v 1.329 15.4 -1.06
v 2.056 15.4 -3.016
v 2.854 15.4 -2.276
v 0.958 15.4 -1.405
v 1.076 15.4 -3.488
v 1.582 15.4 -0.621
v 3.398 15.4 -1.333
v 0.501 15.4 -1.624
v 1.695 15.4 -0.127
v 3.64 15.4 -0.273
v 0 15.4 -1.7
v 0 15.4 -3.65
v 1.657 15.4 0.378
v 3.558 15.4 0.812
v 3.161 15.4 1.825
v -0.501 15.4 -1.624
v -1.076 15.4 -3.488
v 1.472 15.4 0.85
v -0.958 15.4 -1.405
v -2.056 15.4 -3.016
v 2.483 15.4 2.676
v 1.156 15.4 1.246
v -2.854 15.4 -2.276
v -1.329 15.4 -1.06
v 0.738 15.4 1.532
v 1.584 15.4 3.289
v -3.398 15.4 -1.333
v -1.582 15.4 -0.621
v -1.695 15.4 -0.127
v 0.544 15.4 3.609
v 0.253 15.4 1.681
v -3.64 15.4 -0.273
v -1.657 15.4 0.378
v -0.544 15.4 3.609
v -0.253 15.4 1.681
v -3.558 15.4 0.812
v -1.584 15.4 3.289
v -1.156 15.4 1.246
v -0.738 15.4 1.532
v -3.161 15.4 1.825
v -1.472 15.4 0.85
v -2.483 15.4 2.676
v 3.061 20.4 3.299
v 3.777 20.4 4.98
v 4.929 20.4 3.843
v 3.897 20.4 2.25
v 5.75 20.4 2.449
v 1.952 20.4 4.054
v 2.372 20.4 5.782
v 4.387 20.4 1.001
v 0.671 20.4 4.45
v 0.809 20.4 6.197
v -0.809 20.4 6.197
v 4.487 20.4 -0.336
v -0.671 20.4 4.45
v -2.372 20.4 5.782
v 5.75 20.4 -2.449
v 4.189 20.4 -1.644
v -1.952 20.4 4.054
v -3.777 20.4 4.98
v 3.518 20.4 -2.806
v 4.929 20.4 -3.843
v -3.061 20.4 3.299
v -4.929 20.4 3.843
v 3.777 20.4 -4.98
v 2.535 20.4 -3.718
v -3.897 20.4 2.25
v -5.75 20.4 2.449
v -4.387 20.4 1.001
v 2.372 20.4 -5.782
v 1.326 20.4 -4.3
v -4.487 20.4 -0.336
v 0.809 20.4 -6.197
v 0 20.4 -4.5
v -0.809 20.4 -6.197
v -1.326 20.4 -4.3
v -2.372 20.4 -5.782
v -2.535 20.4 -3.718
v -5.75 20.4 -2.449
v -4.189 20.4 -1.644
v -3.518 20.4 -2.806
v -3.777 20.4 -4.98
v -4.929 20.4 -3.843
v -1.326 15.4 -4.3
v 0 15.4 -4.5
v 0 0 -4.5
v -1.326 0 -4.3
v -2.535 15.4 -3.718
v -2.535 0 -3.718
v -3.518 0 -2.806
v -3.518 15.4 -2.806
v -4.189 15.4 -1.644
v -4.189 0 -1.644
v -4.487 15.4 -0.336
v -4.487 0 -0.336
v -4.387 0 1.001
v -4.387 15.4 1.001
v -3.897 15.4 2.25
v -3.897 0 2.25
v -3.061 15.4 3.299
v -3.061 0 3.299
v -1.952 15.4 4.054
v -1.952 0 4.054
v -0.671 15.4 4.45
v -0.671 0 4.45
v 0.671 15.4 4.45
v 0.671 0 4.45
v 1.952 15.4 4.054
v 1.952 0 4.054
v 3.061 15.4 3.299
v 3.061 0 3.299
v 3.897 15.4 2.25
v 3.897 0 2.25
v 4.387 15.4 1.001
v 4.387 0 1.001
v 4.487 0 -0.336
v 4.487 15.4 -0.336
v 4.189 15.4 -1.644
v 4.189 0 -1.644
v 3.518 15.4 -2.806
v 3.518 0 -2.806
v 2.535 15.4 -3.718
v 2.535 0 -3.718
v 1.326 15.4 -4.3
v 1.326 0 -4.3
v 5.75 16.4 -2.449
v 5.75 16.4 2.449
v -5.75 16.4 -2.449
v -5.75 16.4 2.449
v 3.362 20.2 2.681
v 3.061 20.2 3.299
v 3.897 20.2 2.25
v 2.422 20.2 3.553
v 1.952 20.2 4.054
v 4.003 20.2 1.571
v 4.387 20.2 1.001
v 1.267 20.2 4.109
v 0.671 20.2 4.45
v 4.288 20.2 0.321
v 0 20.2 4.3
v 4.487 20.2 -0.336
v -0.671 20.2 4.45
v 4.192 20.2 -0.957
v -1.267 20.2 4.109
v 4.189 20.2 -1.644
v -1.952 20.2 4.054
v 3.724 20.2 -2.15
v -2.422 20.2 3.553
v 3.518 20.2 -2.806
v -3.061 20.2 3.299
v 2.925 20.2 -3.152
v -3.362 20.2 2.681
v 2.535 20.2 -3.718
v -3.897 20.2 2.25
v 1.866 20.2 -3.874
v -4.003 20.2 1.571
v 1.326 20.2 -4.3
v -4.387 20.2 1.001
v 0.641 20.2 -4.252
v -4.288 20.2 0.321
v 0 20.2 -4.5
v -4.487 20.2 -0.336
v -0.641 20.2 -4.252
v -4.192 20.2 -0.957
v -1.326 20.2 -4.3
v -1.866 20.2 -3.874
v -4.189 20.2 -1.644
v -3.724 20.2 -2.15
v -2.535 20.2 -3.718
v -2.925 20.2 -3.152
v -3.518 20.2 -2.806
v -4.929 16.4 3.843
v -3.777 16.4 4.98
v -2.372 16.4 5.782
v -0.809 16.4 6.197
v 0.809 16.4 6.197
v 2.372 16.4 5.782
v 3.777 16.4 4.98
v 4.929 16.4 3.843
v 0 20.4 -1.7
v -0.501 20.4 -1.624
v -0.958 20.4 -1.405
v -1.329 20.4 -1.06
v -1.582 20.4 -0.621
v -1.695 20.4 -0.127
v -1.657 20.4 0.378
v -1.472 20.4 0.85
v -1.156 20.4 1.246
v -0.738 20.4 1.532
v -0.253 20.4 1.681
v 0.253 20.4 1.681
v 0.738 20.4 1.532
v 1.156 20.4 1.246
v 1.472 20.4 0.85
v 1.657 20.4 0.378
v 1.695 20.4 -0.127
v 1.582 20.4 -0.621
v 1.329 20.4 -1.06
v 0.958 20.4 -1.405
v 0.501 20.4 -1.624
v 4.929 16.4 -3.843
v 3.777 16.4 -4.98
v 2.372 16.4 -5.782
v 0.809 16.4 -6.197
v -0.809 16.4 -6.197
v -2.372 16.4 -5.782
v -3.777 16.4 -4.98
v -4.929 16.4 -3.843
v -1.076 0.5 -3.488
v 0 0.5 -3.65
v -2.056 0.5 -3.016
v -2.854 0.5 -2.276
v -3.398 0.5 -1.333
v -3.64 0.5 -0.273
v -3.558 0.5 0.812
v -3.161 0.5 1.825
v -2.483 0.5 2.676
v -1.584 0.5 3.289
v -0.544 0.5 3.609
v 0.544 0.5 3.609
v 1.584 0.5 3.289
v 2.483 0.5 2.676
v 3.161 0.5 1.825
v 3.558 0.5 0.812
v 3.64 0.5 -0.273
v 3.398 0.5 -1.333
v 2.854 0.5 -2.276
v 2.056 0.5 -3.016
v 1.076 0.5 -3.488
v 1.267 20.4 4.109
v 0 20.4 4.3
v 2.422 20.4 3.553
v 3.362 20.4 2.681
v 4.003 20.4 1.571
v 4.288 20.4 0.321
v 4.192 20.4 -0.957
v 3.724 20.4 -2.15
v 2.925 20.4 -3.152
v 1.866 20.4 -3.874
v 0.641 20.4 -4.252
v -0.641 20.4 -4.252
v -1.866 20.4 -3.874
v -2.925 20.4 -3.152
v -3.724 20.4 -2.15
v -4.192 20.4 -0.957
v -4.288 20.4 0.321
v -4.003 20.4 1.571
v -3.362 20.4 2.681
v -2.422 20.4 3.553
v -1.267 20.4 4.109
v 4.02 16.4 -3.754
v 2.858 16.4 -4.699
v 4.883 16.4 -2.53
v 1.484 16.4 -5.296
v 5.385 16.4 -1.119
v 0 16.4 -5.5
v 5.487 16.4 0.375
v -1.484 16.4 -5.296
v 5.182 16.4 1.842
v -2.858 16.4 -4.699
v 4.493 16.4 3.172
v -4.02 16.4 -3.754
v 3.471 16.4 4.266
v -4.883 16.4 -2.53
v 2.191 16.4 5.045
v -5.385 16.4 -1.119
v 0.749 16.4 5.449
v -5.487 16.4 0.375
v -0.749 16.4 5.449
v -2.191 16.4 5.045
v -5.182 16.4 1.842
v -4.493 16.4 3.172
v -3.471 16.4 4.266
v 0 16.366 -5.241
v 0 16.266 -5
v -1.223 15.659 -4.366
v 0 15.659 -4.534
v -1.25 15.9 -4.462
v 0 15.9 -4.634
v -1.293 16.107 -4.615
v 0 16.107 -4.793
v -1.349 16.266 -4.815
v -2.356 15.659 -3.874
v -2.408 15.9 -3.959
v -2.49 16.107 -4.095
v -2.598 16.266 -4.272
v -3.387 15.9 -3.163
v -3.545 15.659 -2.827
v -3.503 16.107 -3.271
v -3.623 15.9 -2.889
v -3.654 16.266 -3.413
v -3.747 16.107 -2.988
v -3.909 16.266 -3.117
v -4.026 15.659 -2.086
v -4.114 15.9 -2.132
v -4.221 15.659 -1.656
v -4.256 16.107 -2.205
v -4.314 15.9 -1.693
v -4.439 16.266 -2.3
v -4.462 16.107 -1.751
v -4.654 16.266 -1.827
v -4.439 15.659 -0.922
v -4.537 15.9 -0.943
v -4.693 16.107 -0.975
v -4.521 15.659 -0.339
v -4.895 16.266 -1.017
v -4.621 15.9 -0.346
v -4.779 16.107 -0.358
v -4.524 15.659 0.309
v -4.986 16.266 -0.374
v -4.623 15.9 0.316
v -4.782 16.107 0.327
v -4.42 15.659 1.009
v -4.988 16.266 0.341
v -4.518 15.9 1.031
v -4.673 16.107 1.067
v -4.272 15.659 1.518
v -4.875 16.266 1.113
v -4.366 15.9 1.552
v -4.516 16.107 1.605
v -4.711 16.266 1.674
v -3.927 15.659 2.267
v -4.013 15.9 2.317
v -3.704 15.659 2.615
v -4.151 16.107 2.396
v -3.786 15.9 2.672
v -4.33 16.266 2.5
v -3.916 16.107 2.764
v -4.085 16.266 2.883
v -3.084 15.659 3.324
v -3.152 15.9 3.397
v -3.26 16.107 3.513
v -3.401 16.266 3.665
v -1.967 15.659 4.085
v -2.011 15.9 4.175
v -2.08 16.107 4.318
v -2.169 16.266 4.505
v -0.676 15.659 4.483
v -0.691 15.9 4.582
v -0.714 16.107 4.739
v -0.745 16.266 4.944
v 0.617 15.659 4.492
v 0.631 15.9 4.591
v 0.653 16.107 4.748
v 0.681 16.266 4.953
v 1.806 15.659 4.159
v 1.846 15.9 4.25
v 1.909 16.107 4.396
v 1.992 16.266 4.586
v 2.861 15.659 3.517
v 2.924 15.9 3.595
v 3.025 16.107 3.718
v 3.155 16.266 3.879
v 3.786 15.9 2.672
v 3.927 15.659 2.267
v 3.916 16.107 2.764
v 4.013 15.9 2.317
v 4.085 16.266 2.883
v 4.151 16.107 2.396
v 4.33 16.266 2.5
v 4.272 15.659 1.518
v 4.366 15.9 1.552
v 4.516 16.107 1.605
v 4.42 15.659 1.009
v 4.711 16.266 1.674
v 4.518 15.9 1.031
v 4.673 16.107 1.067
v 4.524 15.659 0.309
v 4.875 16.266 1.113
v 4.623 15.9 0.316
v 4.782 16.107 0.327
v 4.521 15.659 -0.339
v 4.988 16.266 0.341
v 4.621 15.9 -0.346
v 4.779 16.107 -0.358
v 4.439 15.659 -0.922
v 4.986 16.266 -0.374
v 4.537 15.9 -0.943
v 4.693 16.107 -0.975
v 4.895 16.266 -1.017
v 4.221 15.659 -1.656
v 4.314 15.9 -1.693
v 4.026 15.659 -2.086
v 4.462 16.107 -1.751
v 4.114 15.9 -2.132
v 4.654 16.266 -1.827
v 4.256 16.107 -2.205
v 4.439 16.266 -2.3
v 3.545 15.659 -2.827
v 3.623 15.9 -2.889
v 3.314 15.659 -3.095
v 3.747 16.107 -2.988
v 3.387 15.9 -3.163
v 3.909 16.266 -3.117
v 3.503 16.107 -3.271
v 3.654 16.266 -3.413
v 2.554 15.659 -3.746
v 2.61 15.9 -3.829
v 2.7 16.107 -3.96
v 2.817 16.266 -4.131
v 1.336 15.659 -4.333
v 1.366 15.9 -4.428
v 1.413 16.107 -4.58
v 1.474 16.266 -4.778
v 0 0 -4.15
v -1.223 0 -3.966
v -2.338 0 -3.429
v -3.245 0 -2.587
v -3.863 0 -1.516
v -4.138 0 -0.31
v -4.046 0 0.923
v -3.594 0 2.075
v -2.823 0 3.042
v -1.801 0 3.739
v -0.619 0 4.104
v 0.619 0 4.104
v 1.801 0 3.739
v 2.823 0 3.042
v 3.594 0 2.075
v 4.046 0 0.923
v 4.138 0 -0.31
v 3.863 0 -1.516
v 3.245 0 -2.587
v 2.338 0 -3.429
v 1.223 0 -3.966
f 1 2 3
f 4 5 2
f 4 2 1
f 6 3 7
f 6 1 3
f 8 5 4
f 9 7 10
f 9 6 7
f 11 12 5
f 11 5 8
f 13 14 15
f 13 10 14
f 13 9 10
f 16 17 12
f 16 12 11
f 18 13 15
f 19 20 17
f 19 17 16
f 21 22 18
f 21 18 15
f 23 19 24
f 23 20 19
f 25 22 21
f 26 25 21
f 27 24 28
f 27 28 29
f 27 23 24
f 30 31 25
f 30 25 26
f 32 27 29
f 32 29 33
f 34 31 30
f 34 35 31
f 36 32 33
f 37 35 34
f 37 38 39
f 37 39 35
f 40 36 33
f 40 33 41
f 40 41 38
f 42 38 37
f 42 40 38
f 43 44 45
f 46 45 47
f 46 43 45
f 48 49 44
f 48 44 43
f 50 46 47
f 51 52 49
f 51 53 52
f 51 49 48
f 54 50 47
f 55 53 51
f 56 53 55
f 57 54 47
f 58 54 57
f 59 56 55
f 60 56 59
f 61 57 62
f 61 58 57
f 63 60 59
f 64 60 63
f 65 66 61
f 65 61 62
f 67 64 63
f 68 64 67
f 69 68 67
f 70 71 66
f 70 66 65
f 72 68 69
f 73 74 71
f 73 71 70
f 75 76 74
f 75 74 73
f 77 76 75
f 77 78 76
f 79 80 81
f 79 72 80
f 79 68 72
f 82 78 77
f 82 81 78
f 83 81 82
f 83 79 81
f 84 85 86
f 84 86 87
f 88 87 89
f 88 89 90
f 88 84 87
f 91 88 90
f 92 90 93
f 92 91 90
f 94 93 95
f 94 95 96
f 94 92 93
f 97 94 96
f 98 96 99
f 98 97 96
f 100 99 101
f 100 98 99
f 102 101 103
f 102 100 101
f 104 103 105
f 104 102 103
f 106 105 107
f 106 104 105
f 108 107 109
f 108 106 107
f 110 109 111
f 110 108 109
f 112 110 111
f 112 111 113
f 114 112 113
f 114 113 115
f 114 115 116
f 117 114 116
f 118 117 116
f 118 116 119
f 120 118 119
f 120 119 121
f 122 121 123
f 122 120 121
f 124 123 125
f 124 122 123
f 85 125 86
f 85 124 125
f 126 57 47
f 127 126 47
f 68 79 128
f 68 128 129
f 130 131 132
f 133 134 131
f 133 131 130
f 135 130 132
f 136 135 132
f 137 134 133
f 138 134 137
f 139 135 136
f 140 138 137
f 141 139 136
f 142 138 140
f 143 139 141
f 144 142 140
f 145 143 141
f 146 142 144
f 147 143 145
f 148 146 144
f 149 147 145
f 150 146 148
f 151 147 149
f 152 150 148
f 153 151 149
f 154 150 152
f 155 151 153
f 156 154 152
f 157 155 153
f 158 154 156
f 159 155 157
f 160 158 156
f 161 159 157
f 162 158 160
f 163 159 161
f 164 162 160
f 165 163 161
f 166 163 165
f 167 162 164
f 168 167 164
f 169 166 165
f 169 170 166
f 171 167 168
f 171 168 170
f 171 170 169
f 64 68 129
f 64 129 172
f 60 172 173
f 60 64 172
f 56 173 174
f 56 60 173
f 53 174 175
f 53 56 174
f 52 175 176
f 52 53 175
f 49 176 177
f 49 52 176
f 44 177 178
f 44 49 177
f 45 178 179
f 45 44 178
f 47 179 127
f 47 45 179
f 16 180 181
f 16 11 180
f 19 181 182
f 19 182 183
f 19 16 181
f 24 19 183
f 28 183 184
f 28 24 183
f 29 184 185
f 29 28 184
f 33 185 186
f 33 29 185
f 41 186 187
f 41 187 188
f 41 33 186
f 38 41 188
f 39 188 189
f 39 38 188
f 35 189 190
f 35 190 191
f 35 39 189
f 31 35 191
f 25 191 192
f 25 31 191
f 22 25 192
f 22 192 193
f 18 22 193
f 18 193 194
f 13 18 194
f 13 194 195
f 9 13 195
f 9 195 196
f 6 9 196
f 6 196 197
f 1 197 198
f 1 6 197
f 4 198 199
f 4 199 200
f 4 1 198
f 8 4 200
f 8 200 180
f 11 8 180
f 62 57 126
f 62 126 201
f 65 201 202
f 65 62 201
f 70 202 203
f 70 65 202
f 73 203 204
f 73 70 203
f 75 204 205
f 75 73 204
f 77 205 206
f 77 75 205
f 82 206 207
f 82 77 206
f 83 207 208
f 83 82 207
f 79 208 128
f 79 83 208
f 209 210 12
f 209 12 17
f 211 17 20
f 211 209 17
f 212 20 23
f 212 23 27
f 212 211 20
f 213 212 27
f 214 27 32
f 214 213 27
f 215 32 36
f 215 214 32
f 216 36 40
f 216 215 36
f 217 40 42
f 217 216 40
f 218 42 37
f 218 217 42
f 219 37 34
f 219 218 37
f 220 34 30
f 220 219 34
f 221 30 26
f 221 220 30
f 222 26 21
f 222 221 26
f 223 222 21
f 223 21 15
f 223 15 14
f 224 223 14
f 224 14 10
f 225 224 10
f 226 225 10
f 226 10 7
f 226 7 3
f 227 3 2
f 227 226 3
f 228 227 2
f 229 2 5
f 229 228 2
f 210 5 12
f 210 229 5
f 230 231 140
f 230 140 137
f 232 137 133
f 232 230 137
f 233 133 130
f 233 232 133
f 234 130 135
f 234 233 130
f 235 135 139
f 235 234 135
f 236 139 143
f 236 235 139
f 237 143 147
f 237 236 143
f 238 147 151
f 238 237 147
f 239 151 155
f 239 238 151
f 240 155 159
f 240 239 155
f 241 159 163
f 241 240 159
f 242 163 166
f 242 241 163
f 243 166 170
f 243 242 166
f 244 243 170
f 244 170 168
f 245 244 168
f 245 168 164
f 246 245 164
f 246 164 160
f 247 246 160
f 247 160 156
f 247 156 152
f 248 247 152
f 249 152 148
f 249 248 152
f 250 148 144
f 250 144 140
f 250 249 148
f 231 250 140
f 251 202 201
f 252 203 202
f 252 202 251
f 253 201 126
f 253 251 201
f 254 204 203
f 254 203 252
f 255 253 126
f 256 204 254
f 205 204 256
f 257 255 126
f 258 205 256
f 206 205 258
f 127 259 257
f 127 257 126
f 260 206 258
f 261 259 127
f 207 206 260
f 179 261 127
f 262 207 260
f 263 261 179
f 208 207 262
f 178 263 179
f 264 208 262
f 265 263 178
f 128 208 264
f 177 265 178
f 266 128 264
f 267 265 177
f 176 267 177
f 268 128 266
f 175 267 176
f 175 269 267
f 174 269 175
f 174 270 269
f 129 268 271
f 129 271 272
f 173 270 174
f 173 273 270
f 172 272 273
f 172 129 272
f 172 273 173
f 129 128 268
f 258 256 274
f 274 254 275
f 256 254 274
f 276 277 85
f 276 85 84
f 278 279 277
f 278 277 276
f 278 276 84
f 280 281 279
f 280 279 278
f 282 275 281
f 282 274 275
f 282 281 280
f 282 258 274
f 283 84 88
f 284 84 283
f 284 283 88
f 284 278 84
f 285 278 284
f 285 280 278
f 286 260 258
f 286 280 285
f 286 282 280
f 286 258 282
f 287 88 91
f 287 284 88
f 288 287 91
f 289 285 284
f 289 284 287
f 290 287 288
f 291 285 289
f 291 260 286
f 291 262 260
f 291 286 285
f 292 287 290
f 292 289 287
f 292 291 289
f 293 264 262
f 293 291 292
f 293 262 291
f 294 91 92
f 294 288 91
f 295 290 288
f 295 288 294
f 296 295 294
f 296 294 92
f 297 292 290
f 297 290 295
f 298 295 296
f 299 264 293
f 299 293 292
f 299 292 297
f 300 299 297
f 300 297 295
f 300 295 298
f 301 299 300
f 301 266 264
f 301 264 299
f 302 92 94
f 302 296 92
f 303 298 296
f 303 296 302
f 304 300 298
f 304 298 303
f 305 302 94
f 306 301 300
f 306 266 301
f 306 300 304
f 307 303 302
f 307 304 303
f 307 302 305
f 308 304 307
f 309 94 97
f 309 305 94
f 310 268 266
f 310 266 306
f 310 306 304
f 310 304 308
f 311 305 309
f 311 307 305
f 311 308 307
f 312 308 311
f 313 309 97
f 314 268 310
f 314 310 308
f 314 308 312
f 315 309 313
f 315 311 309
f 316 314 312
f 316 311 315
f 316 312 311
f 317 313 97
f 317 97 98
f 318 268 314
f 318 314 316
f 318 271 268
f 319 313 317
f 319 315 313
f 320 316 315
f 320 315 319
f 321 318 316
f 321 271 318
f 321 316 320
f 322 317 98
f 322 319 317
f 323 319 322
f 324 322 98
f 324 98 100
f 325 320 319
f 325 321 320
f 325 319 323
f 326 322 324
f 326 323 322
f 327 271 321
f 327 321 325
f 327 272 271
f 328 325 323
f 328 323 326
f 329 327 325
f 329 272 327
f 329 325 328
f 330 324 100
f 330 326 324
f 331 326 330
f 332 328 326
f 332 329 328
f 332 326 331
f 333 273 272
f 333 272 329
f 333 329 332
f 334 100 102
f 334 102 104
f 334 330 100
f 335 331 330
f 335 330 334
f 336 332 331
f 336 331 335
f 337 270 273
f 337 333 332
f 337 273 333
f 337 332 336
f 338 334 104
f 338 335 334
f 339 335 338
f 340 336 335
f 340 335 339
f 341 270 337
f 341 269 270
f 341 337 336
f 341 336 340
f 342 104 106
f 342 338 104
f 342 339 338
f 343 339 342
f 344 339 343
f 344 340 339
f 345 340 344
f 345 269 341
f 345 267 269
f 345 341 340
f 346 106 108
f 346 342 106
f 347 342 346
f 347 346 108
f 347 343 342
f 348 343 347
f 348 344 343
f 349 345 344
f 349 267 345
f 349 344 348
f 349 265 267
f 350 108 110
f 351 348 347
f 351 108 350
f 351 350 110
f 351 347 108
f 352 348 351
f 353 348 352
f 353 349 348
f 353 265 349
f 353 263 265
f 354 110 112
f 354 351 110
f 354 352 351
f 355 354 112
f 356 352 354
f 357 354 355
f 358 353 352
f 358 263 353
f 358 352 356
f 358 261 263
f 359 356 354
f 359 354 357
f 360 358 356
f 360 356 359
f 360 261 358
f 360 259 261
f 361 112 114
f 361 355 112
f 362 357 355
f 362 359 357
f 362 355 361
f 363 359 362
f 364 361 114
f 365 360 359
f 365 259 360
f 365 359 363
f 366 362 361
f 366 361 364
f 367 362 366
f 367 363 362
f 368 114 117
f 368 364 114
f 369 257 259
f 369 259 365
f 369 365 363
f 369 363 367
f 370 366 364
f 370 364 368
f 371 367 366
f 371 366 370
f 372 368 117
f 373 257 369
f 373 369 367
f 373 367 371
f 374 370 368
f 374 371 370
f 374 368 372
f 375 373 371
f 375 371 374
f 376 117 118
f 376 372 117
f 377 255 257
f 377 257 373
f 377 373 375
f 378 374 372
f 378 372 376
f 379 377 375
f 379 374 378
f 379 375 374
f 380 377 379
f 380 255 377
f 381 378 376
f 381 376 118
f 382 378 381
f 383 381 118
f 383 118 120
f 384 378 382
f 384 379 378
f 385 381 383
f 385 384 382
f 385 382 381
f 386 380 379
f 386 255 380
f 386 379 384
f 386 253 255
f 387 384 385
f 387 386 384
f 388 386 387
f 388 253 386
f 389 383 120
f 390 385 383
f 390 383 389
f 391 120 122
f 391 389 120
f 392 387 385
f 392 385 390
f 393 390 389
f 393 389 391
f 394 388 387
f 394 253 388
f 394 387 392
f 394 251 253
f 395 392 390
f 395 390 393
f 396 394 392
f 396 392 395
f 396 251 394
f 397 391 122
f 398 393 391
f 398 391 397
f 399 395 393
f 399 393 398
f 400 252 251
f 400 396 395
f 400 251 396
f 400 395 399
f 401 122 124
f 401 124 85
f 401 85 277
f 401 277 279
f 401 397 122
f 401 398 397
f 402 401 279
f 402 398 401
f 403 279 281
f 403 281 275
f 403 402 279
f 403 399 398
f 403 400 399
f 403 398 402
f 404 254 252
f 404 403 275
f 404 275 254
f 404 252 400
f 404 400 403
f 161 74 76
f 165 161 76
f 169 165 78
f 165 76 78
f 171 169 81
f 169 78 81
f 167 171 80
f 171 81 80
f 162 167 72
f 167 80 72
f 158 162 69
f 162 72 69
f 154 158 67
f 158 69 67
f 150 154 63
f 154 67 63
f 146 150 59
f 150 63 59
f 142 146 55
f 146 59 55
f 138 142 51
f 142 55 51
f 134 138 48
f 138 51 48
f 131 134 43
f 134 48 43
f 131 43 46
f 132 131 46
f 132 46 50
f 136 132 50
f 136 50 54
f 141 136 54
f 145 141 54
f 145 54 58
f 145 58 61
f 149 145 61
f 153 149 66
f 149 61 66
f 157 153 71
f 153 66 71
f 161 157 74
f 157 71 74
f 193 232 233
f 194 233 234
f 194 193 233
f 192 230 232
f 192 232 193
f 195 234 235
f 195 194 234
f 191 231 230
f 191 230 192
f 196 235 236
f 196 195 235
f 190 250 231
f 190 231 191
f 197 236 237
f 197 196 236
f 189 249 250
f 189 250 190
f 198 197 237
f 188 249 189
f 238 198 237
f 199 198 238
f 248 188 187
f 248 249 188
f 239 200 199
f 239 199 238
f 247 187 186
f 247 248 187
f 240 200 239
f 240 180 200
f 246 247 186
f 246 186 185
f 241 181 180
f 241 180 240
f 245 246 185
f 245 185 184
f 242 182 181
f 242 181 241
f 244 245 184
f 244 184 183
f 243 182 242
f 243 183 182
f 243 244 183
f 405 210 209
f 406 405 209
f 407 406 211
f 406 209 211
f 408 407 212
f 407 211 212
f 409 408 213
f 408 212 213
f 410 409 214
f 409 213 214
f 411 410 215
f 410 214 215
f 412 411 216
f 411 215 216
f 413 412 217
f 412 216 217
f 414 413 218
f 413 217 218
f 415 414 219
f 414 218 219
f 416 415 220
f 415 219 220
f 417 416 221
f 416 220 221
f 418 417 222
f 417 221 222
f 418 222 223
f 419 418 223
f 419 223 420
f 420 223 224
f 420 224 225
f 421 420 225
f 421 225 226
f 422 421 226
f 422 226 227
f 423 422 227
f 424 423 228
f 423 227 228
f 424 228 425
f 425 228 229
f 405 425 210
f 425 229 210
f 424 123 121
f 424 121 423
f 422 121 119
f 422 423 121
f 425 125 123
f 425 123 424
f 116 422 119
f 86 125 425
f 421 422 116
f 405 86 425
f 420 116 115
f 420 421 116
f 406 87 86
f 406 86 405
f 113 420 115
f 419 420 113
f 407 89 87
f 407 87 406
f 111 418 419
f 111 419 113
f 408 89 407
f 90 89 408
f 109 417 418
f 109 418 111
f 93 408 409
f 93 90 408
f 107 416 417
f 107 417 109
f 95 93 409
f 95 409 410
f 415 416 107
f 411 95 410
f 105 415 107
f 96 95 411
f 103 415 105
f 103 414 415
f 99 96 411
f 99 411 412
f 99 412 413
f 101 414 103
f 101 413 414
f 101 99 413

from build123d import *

# Parameters (mm, degrees)
CHAMFER_1_SIZE      = 0.5
FILLET_1_R          = 1
CUT_EXTRUDE_1_REACH = 24.233
SKETCH_3_R          = 4.5
SKETCH_3_R_2        = 4.3
CUT_EXTRUDE_2_DEPTH = 0.2


with BuildPart() as part:
    # 草图1 → 旋转1 (revolve)
    with BuildSketch(Plane(origin=(0, 0, 0), x_dir=(0, 0, -1), z_dir=(1, 0, 0)), mode=Mode.PRIVATE) as revolve_1_sk:
        Polygon((-3.65, 0), (-4.5, 0), (-4.5, 16.4), (-6.25, 16.4), (-6.25, 20.4), (-1.7, 20.4), (-1.7, 15.4), (-3.65, 15.4), align=None)
    revolve(revolve_1_sk.sketch.rotate(Axis((0, 0, 0), (0, 1, 0)), 180), axis=Axis((0, 0, 0), (0, 1, 0)))

    # 倒角1
    chamfer_1_edges = [part.edges().sort_by_distance(p)[0] for p in [
        (0, 0, 3.65),
    ]]
    chamfer(chamfer_1_edges, length=CHAMFER_1_SIZE)

    # 圆角1
    fillet_1_edges = [part.edges().sort_by_distance(p)[0] for p in [
        (0, 16.4, 4.5),
    ]]
    fillet(fillet_1_edges, radius=FILLET_1_R)

    # 草图2 → 切除-拉伸1 (cut, up to next)
    with BuildSketch(Plane(origin=(0, 20.4, 0), x_dir=(1, 0, 0), z_dir=(0, 1, 0)), mode=Mode.PRIVATE) as cut_extrude_1_sk1:
        with BuildLine():
            Line((-5.75, 2.449489743), (-5.75, -2.449489743))
            ThreePointArc((-5.75, -2.449489743), (-6.25, 0), (-5.75, 2.449489743))
        make_face()
    cut_extrude_1_tool1 = extrude(cut_extrude_1_sk1.sketch, amount=-CUT_EXTRUDE_1_REACH, mode=Mode.PRIVATE) & part.part
    # 草图2 → 切除-拉伸1 (cut, up to next)
    with BuildSketch(Plane(origin=(0, 20.4, 0), x_dir=(1, 0, 0), z_dir=(0, 1, 0)), mode=Mode.PRIVATE) as cut_extrude_1_sk2:
        with BuildLine():
            Line((5.75, 2.449489743), (5.75, -2.449489743))
            ThreePointArc((5.75, -2.449489743), (6.25, 0), (5.75, 2.449489743))
        make_face()
    cut_extrude_1_tool2 = extrude(cut_extrude_1_sk2.sketch, amount=-CUT_EXTRUDE_1_REACH, mode=Mode.PRIVATE) & part.part
    add(cut_extrude_1_tool1.solids().sort_by_distance((-5.950702, 20.4, 0))[0], mode=Mode.SUBTRACT)
    add(cut_extrude_1_tool2.solids().sort_by_distance((5.950702, 20.4, 0))[0], mode=Mode.SUBTRACT)

    # 草图3 → 切除-拉伸2 (cut)
    with BuildSketch(Plane(origin=(0, 20.4, 0), x_dir=(1, 0, 0), z_dir=(0, 1, 0))):
        with Locations(Location((0, 0, 0), (0, 0, 90))):
            Circle(SKETCH_3_R)
        with Locations(Location((0, 0, 0), (0, 0, 270))):
            Circle(SKETCH_3_R_2, mode=Mode.SUBTRACT)
    extrude(amount=-CUT_EXTRUDE_2_DEPTH, mode=Mode.SUBTRACT)


solid = part.part
